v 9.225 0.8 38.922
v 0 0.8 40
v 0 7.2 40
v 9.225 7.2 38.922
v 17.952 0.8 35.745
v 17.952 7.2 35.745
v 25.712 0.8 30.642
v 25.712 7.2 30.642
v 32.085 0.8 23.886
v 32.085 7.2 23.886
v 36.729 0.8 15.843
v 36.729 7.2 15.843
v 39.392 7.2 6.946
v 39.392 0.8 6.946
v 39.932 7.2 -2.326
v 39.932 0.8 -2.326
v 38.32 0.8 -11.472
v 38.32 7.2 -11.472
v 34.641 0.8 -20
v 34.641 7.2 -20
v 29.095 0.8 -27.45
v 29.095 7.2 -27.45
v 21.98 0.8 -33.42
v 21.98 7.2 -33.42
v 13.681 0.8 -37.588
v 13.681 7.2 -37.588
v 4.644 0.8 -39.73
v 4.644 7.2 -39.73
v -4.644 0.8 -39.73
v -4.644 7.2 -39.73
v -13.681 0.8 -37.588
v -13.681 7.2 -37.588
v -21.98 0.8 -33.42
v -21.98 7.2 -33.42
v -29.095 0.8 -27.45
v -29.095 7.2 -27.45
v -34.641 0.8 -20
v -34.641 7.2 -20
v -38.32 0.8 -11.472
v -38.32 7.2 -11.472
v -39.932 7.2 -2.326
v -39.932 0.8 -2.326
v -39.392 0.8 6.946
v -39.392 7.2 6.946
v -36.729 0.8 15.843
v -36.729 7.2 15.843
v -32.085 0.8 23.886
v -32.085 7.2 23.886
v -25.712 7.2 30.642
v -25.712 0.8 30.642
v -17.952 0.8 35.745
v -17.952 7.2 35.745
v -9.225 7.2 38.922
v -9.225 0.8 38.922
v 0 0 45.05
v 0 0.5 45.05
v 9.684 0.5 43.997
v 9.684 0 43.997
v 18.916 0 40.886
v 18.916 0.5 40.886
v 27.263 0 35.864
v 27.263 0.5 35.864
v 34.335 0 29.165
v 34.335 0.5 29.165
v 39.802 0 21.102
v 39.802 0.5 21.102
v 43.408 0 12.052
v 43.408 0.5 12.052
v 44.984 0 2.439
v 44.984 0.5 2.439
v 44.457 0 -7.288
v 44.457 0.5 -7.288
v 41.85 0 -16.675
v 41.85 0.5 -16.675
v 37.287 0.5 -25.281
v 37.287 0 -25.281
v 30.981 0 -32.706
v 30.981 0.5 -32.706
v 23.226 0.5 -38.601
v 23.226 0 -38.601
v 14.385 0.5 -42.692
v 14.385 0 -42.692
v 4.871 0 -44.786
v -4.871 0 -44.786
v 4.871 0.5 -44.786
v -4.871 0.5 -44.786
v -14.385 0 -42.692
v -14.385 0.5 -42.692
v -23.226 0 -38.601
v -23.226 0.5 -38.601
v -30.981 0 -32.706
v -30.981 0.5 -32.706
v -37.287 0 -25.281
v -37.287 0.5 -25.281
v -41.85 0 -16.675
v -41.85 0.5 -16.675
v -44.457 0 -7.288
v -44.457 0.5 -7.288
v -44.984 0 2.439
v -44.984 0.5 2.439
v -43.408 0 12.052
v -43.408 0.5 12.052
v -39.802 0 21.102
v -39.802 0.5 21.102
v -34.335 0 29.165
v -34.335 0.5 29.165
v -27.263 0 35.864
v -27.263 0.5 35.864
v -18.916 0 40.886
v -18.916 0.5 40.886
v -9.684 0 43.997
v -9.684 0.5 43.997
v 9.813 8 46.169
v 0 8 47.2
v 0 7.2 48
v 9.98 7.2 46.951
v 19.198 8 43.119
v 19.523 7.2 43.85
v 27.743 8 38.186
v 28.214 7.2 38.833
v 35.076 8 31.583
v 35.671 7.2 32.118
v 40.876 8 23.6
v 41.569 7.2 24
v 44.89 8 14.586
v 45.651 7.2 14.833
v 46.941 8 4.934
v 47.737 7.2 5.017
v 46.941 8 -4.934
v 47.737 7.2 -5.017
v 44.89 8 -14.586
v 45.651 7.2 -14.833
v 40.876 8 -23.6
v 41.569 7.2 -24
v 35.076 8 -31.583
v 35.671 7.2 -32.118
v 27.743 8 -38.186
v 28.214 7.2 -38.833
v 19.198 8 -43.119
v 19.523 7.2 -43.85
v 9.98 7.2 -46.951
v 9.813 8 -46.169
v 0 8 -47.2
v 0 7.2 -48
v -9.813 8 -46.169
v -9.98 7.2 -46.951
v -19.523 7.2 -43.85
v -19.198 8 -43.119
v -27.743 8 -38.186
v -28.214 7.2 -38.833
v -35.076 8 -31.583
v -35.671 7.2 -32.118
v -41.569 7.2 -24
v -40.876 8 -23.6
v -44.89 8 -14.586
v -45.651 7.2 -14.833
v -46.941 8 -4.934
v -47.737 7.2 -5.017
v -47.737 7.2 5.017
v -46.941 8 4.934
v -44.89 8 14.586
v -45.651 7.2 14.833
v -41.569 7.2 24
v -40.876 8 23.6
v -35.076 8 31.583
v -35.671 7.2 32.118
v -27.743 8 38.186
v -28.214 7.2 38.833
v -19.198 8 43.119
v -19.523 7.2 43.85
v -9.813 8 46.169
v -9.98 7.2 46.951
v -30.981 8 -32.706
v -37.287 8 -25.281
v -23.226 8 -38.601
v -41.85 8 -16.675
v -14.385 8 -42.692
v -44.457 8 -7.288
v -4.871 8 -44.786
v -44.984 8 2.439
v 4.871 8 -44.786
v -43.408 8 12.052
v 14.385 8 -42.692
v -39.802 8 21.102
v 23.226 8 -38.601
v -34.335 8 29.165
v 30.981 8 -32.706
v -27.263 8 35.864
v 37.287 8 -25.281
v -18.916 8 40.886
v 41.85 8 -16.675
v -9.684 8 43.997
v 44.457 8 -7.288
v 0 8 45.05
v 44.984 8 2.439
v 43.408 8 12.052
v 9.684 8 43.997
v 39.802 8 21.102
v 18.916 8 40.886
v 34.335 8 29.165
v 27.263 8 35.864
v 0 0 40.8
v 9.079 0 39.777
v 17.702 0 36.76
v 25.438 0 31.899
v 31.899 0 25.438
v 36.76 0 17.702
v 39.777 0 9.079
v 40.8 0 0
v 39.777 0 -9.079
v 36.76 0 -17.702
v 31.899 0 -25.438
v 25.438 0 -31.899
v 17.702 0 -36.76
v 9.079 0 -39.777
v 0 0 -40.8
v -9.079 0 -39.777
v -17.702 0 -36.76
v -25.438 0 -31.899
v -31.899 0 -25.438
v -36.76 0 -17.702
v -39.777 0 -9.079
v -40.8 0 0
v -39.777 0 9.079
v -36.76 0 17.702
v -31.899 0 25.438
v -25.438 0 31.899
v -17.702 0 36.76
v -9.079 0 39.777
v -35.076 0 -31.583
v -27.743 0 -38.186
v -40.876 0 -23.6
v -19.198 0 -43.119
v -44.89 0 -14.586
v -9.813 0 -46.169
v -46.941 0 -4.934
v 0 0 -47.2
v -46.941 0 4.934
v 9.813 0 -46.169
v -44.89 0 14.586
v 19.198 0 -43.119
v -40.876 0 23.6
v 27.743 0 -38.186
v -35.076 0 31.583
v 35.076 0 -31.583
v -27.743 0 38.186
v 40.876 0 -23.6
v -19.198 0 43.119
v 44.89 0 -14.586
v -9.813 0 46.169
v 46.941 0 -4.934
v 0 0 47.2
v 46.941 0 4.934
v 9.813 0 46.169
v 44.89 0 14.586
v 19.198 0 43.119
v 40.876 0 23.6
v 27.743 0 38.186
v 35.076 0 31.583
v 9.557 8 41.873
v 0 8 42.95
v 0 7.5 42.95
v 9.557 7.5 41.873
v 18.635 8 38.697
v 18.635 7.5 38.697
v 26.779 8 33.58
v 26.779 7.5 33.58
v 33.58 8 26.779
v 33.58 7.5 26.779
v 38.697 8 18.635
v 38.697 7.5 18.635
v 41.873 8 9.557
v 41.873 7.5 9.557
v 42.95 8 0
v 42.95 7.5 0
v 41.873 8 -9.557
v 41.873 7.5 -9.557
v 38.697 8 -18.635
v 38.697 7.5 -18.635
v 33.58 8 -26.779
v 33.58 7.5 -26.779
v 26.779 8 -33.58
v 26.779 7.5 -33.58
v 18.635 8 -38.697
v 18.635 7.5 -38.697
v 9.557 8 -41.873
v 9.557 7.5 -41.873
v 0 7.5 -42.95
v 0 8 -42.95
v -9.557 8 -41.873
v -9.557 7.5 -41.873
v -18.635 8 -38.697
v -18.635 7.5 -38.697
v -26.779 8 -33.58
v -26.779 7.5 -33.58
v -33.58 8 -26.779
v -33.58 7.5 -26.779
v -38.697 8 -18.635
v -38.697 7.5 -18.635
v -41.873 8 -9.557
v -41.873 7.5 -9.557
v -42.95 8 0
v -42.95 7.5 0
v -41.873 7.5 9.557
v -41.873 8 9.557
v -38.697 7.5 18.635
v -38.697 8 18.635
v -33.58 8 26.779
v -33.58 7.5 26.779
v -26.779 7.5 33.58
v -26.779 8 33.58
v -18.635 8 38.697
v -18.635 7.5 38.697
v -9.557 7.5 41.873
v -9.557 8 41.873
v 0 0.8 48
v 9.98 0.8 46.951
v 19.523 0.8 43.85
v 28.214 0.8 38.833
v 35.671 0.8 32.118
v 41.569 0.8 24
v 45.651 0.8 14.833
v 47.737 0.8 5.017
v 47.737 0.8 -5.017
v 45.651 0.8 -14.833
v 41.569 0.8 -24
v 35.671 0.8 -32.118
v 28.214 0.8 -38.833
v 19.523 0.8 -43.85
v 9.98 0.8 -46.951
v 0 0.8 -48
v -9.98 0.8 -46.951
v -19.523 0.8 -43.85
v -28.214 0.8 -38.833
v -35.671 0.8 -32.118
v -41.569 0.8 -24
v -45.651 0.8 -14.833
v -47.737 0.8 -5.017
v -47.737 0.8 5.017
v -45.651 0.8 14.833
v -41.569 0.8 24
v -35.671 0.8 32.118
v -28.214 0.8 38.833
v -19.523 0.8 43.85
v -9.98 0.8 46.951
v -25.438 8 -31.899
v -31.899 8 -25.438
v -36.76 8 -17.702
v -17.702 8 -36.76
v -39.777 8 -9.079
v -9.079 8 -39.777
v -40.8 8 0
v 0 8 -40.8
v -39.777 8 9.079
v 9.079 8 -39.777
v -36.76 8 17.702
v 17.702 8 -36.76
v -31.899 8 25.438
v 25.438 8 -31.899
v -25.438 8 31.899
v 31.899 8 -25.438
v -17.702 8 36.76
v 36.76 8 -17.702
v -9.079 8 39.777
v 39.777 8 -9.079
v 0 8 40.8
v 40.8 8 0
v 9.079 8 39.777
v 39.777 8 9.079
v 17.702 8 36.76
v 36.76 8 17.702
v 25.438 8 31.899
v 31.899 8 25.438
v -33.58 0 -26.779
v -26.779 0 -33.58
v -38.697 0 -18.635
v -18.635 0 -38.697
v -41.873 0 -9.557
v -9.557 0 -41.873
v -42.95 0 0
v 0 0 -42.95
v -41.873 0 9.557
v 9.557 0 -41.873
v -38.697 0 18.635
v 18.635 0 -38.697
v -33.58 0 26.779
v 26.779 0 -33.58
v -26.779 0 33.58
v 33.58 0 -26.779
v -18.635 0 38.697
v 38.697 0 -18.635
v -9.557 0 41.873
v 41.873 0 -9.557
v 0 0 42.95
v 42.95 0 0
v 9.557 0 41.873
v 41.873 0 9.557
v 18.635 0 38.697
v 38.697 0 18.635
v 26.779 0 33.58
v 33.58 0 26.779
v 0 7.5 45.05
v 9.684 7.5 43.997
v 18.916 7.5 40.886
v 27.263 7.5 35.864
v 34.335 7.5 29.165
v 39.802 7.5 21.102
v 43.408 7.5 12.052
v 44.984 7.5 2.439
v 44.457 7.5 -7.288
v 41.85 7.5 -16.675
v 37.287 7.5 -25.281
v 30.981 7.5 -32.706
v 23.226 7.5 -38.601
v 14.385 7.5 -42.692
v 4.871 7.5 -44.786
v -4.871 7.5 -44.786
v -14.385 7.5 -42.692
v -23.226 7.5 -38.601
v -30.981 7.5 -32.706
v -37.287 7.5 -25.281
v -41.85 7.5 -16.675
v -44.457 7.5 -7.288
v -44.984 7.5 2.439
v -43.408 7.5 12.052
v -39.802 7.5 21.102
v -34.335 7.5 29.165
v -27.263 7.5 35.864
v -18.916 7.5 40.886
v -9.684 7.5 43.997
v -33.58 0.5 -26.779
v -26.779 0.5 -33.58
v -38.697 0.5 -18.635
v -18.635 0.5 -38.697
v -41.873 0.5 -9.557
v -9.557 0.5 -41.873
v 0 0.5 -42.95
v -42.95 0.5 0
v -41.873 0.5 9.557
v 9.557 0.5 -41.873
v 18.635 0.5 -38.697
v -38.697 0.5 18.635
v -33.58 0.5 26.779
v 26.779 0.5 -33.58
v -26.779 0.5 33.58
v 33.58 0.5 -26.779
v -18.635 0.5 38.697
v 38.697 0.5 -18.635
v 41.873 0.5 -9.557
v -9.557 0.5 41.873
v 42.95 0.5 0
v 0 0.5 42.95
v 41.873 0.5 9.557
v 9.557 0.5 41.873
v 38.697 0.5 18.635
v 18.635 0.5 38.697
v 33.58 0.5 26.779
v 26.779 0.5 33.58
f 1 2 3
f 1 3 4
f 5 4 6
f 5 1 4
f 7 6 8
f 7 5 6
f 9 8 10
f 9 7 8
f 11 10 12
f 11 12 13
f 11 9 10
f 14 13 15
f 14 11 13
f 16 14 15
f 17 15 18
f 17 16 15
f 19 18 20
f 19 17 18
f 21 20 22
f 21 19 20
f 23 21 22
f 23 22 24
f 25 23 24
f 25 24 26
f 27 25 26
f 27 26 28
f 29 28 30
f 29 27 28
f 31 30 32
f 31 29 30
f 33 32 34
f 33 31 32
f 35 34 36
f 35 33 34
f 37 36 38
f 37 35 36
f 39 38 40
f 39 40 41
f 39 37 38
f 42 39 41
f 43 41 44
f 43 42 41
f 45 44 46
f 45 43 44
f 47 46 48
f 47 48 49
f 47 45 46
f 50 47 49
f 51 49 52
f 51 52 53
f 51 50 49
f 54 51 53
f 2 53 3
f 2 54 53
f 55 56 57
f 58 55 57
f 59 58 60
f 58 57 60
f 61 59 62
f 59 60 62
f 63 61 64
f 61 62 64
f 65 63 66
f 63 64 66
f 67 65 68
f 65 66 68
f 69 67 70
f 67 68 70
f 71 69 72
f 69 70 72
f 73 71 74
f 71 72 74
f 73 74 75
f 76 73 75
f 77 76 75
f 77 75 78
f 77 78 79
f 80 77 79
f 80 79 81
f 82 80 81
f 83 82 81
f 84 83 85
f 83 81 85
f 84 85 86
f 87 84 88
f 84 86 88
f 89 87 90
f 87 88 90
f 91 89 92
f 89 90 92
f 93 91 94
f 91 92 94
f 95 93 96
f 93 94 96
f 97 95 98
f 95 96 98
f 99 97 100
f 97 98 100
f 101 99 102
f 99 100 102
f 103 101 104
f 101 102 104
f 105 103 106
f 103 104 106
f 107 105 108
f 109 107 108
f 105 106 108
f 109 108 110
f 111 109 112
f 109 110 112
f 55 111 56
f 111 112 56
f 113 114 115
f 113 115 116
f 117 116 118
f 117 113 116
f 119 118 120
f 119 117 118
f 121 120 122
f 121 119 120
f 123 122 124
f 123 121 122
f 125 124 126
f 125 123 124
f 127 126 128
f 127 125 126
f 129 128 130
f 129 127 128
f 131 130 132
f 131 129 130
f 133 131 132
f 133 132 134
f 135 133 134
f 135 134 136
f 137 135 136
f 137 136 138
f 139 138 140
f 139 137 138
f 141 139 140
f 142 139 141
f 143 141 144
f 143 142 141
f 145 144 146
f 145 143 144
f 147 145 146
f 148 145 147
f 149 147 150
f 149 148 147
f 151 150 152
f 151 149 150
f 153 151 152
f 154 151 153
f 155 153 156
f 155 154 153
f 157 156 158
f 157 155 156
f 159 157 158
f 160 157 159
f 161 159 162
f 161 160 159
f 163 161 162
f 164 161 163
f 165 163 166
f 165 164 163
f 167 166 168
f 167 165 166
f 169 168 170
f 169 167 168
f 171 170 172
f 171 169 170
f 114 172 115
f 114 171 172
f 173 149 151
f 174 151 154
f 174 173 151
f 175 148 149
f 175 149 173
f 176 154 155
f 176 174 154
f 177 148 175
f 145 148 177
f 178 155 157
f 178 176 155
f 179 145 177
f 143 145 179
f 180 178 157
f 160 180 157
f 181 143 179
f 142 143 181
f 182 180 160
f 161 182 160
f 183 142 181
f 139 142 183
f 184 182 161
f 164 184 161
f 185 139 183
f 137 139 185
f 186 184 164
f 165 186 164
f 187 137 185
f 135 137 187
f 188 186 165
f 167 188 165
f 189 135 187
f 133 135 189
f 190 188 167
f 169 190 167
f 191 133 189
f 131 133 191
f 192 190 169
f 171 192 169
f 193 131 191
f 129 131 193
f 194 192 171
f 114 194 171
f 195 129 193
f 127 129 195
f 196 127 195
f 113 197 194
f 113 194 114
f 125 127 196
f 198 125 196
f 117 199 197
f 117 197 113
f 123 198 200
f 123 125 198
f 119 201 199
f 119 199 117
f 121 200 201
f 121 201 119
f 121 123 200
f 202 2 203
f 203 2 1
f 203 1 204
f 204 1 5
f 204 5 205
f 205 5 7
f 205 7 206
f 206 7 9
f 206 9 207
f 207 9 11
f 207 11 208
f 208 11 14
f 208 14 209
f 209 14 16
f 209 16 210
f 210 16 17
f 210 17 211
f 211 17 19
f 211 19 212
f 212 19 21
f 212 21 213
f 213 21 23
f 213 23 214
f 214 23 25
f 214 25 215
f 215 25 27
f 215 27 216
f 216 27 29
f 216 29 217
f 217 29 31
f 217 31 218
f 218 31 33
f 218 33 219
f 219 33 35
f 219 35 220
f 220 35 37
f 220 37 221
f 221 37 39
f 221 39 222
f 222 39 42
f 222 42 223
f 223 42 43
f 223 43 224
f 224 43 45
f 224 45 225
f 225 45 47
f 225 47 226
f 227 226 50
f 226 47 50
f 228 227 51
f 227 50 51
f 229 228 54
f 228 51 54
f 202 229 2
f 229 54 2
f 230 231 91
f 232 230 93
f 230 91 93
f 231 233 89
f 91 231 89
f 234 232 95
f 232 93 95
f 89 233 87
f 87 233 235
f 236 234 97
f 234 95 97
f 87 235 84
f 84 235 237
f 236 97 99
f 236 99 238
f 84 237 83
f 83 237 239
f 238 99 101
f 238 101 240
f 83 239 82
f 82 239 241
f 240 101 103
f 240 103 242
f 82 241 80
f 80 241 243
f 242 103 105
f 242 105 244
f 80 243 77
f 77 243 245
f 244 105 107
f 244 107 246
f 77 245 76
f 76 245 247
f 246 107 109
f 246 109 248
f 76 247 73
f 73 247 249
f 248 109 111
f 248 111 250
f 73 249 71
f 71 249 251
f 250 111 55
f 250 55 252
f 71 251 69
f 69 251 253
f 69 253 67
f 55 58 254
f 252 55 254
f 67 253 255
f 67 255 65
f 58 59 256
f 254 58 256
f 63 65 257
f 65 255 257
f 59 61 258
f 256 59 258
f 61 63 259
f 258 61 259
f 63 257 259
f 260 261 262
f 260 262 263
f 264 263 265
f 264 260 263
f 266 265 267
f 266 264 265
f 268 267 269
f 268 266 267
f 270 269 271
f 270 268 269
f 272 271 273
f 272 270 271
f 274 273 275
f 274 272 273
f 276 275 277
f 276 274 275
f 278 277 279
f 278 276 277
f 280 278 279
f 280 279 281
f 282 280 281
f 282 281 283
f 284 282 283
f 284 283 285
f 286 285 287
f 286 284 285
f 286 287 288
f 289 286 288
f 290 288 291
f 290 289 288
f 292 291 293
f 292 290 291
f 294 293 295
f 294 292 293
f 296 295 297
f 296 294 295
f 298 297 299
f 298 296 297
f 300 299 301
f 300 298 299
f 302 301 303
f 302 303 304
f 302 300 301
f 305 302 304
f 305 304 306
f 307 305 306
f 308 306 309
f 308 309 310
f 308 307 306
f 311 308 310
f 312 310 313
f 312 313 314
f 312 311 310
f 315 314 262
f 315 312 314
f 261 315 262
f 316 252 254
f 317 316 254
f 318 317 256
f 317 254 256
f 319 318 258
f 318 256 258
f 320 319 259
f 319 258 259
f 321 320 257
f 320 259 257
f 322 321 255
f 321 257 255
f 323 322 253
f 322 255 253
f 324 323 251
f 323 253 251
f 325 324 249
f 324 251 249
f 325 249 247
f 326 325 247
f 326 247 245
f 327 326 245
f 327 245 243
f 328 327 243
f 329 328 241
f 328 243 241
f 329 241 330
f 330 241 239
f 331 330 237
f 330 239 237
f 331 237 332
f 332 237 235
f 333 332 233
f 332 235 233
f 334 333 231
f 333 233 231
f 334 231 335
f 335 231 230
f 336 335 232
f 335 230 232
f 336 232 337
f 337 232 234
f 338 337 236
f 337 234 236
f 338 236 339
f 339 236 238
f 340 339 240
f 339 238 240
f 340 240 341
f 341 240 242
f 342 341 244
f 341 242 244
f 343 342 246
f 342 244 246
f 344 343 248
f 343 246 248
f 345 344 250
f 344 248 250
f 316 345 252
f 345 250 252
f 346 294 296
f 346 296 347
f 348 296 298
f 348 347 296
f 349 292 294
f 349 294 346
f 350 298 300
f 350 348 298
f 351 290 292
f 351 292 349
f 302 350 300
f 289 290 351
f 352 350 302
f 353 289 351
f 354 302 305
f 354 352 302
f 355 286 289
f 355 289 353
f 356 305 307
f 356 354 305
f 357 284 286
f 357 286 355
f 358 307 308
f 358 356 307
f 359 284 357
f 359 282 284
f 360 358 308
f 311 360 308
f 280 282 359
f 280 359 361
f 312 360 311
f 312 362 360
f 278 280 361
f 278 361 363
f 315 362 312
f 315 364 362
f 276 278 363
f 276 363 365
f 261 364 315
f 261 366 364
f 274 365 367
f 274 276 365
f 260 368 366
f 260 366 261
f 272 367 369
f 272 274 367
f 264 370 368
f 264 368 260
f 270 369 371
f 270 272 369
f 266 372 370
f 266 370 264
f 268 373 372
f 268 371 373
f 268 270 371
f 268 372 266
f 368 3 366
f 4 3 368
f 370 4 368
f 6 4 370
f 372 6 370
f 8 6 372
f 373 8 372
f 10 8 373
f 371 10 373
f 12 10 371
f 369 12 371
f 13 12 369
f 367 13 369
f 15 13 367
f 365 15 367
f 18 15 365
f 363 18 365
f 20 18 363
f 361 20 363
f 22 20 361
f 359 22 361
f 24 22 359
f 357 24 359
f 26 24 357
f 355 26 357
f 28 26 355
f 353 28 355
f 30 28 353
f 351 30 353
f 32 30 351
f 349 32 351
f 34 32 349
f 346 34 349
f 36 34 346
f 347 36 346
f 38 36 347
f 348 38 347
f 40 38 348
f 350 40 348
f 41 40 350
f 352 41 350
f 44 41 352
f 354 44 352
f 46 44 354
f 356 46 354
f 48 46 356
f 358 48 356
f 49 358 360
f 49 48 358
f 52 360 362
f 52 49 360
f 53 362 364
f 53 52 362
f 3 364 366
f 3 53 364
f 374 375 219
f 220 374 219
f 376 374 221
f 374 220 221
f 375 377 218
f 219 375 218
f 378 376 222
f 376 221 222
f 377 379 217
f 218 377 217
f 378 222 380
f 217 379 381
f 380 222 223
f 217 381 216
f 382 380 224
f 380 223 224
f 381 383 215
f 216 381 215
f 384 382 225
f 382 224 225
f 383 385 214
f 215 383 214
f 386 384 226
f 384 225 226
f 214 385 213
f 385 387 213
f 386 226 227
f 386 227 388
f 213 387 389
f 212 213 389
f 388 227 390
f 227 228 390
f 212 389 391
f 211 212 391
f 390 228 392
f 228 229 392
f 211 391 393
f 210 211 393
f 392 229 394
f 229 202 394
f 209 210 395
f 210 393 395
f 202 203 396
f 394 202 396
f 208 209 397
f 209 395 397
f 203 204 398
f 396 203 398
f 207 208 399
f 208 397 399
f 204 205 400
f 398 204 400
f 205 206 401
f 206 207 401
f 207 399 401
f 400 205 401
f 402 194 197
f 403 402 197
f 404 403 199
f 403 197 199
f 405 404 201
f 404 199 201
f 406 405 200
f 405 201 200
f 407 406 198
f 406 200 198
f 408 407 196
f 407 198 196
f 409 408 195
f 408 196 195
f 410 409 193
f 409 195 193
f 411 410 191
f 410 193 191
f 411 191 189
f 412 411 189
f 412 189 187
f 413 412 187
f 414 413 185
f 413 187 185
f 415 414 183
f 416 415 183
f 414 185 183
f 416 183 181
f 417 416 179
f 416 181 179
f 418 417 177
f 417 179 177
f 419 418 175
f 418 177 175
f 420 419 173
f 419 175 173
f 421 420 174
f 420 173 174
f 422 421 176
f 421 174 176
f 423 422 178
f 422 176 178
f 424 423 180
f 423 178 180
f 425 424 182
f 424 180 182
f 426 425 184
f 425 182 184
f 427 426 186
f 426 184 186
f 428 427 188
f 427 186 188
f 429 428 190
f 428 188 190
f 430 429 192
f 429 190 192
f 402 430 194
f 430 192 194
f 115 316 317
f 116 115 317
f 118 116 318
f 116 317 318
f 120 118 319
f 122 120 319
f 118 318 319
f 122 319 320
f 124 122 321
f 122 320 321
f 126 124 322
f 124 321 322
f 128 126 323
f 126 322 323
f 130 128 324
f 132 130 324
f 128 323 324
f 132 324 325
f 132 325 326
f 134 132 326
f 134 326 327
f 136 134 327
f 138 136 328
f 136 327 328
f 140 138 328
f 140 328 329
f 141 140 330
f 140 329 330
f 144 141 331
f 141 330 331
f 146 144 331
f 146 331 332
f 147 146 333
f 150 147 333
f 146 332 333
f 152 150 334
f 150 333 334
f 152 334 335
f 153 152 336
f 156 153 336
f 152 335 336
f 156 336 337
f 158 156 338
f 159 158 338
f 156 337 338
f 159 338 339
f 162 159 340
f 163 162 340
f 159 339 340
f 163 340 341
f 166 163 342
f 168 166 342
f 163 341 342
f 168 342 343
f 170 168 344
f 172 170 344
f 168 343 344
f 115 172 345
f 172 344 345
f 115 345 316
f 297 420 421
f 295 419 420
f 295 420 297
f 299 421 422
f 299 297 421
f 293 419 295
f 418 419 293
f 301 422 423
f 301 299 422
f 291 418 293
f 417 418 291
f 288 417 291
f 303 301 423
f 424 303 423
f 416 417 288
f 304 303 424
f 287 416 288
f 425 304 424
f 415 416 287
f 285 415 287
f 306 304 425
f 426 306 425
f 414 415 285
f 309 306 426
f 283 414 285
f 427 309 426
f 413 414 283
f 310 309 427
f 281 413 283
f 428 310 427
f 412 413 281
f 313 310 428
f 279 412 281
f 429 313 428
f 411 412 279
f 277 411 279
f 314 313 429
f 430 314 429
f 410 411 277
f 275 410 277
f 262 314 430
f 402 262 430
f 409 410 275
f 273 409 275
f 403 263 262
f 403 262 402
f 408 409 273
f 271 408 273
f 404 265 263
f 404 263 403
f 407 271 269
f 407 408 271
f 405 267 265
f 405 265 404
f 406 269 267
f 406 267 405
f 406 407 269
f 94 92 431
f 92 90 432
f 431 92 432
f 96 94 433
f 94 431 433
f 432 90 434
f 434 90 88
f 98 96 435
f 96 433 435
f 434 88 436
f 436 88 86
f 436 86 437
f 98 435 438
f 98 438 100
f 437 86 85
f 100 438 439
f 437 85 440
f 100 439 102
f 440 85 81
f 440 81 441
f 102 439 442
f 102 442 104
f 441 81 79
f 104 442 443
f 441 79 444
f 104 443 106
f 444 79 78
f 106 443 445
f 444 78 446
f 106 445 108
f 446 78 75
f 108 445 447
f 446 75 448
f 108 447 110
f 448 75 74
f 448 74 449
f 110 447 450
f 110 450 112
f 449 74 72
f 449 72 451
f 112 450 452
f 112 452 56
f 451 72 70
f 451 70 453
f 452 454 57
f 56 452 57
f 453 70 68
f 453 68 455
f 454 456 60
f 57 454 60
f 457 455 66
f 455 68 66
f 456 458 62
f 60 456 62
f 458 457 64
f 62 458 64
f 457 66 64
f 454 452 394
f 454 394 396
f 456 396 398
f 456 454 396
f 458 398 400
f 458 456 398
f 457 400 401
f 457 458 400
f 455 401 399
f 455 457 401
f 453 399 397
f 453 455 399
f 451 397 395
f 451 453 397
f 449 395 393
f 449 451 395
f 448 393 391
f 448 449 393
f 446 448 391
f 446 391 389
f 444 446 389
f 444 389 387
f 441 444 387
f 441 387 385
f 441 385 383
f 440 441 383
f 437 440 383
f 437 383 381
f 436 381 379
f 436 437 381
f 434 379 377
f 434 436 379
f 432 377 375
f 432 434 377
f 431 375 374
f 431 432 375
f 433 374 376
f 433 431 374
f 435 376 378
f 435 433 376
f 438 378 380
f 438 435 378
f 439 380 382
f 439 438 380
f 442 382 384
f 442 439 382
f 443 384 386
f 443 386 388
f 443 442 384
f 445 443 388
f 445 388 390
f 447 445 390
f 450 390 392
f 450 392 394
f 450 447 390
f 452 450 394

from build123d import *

# Parameters (mm, degrees)
SKETCH_1_R          = 48
SKETCH_1_R_2        = 40
EXTRUDE_1_DEPTH     = 8
SKETCH_2_R          = 45.05
SKETCH_2_R_2        = 42.95
CUT_EXTRUDE_1_DEPTH = 0.5
CUT_EXTRUDE_START   = -7.5
SKETCH_2_2_R        = 45.05
SKETCH_2_2_R_2      = 42.95
CUT_EXTRUDE_2_DEPTH = 0.5
CHAMFER_1_SIZE      = 0.8


with BuildPart() as part:
    # 草图1 → 凸台-拉伸1 (new body)
    with BuildSketch(Plane(origin=(0, 0, 0), x_dir=(1, 0, 0), z_dir=(0, 1, 0))):
        with Locations(Location((0, 0, 0), (0, 0, 270))):
            Circle(SKETCH_1_R)
        with Locations(Location((0, 0, 0), (0, 0, 270))):
            Circle(SKETCH_1_R_2, mode=Mode.SUBTRACT)
    extrude(amount=EXTRUDE_1_DEPTH)

    # 草图2 → 切除-拉伸1 (cut)
    with BuildSketch(Plane(origin=(0, 8, 0), x_dir=(1, 0, 0), z_dir=(0, 1, 0))):
        with Locations(Location((0, 0, 0), (0, 0, 270))):
            Circle(SKETCH_2_R)
        with Locations(Location((0, 0, 0), (0, 0, 270))):
            Circle(SKETCH_2_R_2, mode=Mode.SUBTRACT)
    extrude(amount=-CUT_EXTRUDE_1_DEPTH, mode=Mode.SUBTRACT)

    # 草图2<2> → 切除-拉伸2 (cut)
    with BuildSketch(Plane(origin=(0, 8, 0), x_dir=(1, 0, 0), z_dir=(0, 1, 0)).offset(CUT_EXTRUDE_START)):
        with Locations(Location((0, 0, 0), (0, 0, 270))):
            Circle(SKETCH_2_2_R)
        with Locations(Location((0, 0, 0), (0, 0, 270))):
            Circle(SKETCH_2_2_R_2, mode=Mode.SUBTRACT)
    extrude(amount=-CUT_EXTRUDE_2_DEPTH, mode=Mode.SUBTRACT)

    # 倒角1
    chamfer_1_edges = [part.edges().sort_by_distance(p)[0] for p in [
        (0, 0, -48),
        (0, 8, -48),
        (0, 0, -40),
        (0, 8, -40),
    ]]
    chamfer(chamfer_1_edges, length=CHAMFER_1_SIZE)


solid = part.part
